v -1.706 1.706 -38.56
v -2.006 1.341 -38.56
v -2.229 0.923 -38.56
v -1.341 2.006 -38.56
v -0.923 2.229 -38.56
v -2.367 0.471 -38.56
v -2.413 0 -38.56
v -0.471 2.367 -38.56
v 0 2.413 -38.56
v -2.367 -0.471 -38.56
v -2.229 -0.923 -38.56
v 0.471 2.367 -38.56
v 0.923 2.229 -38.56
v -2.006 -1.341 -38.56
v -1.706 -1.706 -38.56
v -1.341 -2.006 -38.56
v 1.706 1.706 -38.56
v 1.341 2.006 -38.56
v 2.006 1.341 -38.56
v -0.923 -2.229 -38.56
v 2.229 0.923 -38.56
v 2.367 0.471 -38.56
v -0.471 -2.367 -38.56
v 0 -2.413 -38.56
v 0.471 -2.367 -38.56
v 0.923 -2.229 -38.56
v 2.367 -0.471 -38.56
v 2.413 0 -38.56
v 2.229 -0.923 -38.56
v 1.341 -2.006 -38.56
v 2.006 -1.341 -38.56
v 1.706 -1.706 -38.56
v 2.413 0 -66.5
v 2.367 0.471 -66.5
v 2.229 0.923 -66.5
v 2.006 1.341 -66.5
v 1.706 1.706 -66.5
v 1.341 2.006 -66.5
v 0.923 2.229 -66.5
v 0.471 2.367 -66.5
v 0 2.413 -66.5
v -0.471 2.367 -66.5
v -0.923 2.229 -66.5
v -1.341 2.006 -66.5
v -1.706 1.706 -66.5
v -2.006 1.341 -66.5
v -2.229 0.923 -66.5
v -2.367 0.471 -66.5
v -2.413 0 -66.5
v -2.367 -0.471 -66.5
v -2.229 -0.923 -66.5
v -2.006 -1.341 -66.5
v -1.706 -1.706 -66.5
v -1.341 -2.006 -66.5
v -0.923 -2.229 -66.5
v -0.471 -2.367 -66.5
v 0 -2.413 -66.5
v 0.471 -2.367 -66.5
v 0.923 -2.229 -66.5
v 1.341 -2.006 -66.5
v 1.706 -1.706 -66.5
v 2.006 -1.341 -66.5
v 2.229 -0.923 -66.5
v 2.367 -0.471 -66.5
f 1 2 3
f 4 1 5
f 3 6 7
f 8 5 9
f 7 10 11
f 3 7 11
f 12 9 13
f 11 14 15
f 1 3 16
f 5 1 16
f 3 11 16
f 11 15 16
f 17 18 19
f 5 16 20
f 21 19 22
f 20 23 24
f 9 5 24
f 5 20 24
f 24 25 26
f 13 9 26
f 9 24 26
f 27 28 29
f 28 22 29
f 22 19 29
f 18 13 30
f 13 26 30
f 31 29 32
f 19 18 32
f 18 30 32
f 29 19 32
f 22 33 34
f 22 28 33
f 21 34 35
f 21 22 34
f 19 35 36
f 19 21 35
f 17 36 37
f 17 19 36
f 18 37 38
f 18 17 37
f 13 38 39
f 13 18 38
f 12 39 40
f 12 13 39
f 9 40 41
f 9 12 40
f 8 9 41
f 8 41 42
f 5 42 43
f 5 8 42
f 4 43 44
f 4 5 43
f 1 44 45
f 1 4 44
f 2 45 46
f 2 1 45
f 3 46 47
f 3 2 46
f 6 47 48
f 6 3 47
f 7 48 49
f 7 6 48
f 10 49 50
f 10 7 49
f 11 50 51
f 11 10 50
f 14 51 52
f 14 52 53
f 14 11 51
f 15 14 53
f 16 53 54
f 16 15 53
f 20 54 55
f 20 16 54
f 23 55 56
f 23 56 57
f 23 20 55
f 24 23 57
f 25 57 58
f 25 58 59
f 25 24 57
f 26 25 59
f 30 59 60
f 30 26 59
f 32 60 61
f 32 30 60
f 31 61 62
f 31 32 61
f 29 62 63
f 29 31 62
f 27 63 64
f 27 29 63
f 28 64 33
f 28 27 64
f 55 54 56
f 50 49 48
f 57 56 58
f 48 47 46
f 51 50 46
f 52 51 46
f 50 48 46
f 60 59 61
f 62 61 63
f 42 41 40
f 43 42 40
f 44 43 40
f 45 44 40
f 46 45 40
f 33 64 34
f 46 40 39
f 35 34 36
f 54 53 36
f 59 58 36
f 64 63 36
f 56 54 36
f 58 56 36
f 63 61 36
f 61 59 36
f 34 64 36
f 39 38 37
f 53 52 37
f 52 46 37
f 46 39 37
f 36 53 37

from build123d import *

# Parameters (mm, degrees)
SKETCH1_R               = 2.413
BOSS_EXTRUDE1_DEPTH     = 66.5
SKETCH2_W               = 4.826
SKETCH2_H               = 0.508
CUT_EXTRUDE1_DEPTH      = 6
CUT_EXTRUDE2_DEPTH      = 67.587499863
CUT_EXTRUDE2_DEPTH_BACK = 67.587499863
SKETCH3_W               = 4.826
SKETCH3_H               = 105.06


with BuildPart() as part:
    # Sketch1 → Boss-Extrude1 (new, symmetric)
    with BuildSketch(Plane.XY):
        Circle(SKETCH1_R)
    extrude(amount=BOSS_EXTRUDE1_DEPTH, both=True)

    # Sketch2 → Cut-Extrude1 (cut)
    with BuildSketch(Plane.XY.offset(66.5)):
        with Locations((0, 2.159)):
            Rectangle(SKETCH2_W, SKETCH2_H)
    extrude(amount=-CUT_EXTRUDE1_DEPTH, mode=Mode.SUBTRACT)

    # Sketch3 → Cut-Extrude2 (cut, two sides: drawn at the far end of the back side and taken through both)
    with BuildSketch(Plane(origin=(0, 0, 0), x_dir=(1, 0, 0), z_dir=(0, 1, 0)).offset(-CUT_EXTRUDE2_DEPTH_BACK)):
        with Locations((0, -13.97)):
            Rectangle(SKETCH3_W, SKETCH3_H)
    extrude(amount=CUT_EXTRUDE2_DEPTH + CUT_EXTRUDE2_DEPTH_BACK, mode=Mode.SUBTRACT)


solid = part.part
